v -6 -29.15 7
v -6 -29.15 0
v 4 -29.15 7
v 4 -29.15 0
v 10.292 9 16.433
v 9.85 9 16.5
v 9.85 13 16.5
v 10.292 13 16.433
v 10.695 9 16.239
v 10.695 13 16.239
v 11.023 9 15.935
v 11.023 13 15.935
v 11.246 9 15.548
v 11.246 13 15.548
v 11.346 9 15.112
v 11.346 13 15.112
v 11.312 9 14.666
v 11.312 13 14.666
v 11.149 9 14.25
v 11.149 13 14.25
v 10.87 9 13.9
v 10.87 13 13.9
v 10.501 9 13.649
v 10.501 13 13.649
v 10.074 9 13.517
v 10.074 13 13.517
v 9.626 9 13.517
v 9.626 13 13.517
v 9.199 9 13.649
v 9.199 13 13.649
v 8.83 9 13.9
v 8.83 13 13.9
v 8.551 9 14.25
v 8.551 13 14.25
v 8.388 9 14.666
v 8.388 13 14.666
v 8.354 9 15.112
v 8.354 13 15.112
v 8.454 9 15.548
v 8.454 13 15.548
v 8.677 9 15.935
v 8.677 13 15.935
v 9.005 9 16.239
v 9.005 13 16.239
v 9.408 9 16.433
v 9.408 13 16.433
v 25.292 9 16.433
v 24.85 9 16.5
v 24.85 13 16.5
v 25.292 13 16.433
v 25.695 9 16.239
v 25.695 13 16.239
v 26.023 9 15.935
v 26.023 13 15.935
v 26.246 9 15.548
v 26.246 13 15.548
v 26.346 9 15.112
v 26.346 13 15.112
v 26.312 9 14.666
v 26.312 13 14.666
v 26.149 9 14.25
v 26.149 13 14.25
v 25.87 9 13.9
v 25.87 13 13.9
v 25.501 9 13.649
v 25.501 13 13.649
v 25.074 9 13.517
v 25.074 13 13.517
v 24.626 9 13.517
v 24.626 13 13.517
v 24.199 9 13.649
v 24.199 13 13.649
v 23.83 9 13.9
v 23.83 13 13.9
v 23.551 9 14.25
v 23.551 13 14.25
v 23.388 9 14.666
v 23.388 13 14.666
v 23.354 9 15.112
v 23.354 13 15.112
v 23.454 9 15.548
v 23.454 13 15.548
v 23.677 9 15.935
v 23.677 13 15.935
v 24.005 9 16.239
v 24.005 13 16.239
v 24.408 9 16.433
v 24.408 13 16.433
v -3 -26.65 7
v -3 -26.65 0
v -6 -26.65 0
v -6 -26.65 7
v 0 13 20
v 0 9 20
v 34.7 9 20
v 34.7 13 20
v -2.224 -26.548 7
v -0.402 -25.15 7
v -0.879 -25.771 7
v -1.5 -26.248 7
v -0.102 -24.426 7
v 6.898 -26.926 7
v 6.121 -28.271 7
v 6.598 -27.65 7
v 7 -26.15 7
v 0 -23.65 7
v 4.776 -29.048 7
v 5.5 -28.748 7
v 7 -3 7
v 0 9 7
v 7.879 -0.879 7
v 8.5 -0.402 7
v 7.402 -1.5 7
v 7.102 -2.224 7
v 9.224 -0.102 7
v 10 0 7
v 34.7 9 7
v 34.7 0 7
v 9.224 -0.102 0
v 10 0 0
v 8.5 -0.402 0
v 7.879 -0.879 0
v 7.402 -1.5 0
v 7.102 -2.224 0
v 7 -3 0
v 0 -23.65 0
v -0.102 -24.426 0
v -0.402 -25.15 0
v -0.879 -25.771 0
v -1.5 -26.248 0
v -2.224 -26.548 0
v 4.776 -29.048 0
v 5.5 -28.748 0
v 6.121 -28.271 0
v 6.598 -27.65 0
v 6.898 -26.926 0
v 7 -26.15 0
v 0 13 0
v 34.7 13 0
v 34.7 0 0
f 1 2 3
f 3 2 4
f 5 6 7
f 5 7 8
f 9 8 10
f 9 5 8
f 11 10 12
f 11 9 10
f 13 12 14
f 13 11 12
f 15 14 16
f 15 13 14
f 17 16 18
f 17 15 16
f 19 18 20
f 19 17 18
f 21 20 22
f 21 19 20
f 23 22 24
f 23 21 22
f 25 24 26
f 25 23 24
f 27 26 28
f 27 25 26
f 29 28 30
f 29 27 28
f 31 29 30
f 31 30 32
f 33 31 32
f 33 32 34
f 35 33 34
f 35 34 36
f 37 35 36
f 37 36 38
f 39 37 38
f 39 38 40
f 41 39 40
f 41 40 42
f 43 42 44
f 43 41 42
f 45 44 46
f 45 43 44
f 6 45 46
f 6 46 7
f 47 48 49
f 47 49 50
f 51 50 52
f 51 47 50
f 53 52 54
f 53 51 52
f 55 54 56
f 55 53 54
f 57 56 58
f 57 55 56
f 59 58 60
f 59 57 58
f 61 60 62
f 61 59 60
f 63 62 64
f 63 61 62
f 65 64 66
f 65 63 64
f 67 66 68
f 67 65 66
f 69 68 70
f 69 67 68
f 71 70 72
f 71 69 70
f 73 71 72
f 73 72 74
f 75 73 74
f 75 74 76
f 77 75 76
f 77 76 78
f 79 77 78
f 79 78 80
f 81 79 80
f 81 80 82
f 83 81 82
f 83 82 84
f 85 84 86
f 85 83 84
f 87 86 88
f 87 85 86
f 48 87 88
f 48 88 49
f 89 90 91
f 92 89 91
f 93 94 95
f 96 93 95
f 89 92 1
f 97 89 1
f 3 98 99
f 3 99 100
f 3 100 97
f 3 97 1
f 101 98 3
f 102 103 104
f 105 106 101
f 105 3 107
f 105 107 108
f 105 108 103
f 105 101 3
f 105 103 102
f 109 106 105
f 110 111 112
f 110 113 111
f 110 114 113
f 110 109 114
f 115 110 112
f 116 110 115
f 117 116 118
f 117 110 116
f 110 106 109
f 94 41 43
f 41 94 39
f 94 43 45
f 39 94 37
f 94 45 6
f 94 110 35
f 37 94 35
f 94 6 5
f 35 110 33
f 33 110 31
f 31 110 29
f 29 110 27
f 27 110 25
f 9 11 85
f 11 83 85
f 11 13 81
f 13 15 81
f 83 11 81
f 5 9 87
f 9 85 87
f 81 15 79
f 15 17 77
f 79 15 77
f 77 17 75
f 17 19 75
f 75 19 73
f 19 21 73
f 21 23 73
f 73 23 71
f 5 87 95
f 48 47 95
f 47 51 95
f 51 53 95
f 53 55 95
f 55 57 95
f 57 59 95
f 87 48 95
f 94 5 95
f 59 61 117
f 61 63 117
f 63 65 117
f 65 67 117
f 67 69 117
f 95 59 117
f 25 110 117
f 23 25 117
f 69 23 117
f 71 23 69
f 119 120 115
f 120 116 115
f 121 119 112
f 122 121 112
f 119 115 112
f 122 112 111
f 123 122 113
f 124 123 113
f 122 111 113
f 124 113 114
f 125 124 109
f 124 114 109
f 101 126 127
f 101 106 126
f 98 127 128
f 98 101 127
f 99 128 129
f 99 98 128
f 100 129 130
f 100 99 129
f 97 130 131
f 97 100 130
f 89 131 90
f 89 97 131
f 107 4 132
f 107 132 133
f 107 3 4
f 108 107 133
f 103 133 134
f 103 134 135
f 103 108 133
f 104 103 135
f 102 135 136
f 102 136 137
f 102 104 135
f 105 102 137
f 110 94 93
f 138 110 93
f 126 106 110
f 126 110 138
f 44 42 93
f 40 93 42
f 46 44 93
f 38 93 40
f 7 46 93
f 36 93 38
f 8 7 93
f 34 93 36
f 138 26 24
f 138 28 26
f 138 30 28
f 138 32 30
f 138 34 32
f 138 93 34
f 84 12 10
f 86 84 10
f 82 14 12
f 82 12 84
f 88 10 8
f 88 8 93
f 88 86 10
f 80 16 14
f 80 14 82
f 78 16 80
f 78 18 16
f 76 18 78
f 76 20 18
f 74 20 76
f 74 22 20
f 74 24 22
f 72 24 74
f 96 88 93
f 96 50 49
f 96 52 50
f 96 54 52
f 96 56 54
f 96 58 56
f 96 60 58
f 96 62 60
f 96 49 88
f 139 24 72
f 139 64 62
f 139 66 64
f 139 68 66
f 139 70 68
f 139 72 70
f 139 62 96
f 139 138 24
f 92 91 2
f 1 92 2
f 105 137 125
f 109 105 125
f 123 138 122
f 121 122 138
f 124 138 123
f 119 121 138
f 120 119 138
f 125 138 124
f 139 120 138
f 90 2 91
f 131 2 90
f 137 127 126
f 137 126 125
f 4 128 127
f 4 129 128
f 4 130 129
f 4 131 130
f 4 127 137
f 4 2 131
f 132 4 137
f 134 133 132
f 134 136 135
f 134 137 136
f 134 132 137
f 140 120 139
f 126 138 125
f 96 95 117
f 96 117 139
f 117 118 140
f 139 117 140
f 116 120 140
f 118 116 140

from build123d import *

# Parameters (mm, degrees)
BOSS_EXTRUDE1_DEPTH = 7
FILLET1_R           = 3
SKETCH3_W           = 34.7
SKETCH3_H           = 20
SKETCH3_R           = 1.5
BOSS_EXTRUDE2_DEPTH = 4


with BuildPart() as part:
    # Sketch1 → Boss-Extrude1 (new body)
    with BuildSketch(Plane.XY):
        Polygon((7, 0), (34.7, 0), (34.7, 9), (0, 9), (0, 0), (0, -26.65), (-6, -26.65), (-6, -29.15), (0, -29.15), (7, -29.15), align=None)
    extrude(amount=BOSS_EXTRUDE1_DEPTH)

    # Fillet1
    fillet1_edges = [part.edges().sort_by_distance(p)[0] for p in [
        (7, 0, 3.5),
        (7, -29.15, 3.5),
        (0, -26.65, 3.5),
    ]]
    fillet(fillet1_edges, radius=FILLET1_R)

    # Sketch3 → Boss-Extrude2 (add)
    with BuildSketch(Plane(origin=(0, 9, 0), x_dir=(1, 0, 0), z_dir=(0, 1, 0))):
        with Locations((17.35, -10)):
            Rectangle(SKETCH3_W, SKETCH3_H)
        with Locations(Location((24.85, -15, 0), (0, 0, 270))):
            Circle(SKETCH3_R, mode=Mode.SUBTRACT)
        with Locations(Location((9.85, -15, 0), (0, 0, 270))):
            Circle(SKETCH3_R, mode=Mode.SUBTRACT)
    extrude(amount=BOSS_EXTRUDE2_DEPTH)


solid = part.part
